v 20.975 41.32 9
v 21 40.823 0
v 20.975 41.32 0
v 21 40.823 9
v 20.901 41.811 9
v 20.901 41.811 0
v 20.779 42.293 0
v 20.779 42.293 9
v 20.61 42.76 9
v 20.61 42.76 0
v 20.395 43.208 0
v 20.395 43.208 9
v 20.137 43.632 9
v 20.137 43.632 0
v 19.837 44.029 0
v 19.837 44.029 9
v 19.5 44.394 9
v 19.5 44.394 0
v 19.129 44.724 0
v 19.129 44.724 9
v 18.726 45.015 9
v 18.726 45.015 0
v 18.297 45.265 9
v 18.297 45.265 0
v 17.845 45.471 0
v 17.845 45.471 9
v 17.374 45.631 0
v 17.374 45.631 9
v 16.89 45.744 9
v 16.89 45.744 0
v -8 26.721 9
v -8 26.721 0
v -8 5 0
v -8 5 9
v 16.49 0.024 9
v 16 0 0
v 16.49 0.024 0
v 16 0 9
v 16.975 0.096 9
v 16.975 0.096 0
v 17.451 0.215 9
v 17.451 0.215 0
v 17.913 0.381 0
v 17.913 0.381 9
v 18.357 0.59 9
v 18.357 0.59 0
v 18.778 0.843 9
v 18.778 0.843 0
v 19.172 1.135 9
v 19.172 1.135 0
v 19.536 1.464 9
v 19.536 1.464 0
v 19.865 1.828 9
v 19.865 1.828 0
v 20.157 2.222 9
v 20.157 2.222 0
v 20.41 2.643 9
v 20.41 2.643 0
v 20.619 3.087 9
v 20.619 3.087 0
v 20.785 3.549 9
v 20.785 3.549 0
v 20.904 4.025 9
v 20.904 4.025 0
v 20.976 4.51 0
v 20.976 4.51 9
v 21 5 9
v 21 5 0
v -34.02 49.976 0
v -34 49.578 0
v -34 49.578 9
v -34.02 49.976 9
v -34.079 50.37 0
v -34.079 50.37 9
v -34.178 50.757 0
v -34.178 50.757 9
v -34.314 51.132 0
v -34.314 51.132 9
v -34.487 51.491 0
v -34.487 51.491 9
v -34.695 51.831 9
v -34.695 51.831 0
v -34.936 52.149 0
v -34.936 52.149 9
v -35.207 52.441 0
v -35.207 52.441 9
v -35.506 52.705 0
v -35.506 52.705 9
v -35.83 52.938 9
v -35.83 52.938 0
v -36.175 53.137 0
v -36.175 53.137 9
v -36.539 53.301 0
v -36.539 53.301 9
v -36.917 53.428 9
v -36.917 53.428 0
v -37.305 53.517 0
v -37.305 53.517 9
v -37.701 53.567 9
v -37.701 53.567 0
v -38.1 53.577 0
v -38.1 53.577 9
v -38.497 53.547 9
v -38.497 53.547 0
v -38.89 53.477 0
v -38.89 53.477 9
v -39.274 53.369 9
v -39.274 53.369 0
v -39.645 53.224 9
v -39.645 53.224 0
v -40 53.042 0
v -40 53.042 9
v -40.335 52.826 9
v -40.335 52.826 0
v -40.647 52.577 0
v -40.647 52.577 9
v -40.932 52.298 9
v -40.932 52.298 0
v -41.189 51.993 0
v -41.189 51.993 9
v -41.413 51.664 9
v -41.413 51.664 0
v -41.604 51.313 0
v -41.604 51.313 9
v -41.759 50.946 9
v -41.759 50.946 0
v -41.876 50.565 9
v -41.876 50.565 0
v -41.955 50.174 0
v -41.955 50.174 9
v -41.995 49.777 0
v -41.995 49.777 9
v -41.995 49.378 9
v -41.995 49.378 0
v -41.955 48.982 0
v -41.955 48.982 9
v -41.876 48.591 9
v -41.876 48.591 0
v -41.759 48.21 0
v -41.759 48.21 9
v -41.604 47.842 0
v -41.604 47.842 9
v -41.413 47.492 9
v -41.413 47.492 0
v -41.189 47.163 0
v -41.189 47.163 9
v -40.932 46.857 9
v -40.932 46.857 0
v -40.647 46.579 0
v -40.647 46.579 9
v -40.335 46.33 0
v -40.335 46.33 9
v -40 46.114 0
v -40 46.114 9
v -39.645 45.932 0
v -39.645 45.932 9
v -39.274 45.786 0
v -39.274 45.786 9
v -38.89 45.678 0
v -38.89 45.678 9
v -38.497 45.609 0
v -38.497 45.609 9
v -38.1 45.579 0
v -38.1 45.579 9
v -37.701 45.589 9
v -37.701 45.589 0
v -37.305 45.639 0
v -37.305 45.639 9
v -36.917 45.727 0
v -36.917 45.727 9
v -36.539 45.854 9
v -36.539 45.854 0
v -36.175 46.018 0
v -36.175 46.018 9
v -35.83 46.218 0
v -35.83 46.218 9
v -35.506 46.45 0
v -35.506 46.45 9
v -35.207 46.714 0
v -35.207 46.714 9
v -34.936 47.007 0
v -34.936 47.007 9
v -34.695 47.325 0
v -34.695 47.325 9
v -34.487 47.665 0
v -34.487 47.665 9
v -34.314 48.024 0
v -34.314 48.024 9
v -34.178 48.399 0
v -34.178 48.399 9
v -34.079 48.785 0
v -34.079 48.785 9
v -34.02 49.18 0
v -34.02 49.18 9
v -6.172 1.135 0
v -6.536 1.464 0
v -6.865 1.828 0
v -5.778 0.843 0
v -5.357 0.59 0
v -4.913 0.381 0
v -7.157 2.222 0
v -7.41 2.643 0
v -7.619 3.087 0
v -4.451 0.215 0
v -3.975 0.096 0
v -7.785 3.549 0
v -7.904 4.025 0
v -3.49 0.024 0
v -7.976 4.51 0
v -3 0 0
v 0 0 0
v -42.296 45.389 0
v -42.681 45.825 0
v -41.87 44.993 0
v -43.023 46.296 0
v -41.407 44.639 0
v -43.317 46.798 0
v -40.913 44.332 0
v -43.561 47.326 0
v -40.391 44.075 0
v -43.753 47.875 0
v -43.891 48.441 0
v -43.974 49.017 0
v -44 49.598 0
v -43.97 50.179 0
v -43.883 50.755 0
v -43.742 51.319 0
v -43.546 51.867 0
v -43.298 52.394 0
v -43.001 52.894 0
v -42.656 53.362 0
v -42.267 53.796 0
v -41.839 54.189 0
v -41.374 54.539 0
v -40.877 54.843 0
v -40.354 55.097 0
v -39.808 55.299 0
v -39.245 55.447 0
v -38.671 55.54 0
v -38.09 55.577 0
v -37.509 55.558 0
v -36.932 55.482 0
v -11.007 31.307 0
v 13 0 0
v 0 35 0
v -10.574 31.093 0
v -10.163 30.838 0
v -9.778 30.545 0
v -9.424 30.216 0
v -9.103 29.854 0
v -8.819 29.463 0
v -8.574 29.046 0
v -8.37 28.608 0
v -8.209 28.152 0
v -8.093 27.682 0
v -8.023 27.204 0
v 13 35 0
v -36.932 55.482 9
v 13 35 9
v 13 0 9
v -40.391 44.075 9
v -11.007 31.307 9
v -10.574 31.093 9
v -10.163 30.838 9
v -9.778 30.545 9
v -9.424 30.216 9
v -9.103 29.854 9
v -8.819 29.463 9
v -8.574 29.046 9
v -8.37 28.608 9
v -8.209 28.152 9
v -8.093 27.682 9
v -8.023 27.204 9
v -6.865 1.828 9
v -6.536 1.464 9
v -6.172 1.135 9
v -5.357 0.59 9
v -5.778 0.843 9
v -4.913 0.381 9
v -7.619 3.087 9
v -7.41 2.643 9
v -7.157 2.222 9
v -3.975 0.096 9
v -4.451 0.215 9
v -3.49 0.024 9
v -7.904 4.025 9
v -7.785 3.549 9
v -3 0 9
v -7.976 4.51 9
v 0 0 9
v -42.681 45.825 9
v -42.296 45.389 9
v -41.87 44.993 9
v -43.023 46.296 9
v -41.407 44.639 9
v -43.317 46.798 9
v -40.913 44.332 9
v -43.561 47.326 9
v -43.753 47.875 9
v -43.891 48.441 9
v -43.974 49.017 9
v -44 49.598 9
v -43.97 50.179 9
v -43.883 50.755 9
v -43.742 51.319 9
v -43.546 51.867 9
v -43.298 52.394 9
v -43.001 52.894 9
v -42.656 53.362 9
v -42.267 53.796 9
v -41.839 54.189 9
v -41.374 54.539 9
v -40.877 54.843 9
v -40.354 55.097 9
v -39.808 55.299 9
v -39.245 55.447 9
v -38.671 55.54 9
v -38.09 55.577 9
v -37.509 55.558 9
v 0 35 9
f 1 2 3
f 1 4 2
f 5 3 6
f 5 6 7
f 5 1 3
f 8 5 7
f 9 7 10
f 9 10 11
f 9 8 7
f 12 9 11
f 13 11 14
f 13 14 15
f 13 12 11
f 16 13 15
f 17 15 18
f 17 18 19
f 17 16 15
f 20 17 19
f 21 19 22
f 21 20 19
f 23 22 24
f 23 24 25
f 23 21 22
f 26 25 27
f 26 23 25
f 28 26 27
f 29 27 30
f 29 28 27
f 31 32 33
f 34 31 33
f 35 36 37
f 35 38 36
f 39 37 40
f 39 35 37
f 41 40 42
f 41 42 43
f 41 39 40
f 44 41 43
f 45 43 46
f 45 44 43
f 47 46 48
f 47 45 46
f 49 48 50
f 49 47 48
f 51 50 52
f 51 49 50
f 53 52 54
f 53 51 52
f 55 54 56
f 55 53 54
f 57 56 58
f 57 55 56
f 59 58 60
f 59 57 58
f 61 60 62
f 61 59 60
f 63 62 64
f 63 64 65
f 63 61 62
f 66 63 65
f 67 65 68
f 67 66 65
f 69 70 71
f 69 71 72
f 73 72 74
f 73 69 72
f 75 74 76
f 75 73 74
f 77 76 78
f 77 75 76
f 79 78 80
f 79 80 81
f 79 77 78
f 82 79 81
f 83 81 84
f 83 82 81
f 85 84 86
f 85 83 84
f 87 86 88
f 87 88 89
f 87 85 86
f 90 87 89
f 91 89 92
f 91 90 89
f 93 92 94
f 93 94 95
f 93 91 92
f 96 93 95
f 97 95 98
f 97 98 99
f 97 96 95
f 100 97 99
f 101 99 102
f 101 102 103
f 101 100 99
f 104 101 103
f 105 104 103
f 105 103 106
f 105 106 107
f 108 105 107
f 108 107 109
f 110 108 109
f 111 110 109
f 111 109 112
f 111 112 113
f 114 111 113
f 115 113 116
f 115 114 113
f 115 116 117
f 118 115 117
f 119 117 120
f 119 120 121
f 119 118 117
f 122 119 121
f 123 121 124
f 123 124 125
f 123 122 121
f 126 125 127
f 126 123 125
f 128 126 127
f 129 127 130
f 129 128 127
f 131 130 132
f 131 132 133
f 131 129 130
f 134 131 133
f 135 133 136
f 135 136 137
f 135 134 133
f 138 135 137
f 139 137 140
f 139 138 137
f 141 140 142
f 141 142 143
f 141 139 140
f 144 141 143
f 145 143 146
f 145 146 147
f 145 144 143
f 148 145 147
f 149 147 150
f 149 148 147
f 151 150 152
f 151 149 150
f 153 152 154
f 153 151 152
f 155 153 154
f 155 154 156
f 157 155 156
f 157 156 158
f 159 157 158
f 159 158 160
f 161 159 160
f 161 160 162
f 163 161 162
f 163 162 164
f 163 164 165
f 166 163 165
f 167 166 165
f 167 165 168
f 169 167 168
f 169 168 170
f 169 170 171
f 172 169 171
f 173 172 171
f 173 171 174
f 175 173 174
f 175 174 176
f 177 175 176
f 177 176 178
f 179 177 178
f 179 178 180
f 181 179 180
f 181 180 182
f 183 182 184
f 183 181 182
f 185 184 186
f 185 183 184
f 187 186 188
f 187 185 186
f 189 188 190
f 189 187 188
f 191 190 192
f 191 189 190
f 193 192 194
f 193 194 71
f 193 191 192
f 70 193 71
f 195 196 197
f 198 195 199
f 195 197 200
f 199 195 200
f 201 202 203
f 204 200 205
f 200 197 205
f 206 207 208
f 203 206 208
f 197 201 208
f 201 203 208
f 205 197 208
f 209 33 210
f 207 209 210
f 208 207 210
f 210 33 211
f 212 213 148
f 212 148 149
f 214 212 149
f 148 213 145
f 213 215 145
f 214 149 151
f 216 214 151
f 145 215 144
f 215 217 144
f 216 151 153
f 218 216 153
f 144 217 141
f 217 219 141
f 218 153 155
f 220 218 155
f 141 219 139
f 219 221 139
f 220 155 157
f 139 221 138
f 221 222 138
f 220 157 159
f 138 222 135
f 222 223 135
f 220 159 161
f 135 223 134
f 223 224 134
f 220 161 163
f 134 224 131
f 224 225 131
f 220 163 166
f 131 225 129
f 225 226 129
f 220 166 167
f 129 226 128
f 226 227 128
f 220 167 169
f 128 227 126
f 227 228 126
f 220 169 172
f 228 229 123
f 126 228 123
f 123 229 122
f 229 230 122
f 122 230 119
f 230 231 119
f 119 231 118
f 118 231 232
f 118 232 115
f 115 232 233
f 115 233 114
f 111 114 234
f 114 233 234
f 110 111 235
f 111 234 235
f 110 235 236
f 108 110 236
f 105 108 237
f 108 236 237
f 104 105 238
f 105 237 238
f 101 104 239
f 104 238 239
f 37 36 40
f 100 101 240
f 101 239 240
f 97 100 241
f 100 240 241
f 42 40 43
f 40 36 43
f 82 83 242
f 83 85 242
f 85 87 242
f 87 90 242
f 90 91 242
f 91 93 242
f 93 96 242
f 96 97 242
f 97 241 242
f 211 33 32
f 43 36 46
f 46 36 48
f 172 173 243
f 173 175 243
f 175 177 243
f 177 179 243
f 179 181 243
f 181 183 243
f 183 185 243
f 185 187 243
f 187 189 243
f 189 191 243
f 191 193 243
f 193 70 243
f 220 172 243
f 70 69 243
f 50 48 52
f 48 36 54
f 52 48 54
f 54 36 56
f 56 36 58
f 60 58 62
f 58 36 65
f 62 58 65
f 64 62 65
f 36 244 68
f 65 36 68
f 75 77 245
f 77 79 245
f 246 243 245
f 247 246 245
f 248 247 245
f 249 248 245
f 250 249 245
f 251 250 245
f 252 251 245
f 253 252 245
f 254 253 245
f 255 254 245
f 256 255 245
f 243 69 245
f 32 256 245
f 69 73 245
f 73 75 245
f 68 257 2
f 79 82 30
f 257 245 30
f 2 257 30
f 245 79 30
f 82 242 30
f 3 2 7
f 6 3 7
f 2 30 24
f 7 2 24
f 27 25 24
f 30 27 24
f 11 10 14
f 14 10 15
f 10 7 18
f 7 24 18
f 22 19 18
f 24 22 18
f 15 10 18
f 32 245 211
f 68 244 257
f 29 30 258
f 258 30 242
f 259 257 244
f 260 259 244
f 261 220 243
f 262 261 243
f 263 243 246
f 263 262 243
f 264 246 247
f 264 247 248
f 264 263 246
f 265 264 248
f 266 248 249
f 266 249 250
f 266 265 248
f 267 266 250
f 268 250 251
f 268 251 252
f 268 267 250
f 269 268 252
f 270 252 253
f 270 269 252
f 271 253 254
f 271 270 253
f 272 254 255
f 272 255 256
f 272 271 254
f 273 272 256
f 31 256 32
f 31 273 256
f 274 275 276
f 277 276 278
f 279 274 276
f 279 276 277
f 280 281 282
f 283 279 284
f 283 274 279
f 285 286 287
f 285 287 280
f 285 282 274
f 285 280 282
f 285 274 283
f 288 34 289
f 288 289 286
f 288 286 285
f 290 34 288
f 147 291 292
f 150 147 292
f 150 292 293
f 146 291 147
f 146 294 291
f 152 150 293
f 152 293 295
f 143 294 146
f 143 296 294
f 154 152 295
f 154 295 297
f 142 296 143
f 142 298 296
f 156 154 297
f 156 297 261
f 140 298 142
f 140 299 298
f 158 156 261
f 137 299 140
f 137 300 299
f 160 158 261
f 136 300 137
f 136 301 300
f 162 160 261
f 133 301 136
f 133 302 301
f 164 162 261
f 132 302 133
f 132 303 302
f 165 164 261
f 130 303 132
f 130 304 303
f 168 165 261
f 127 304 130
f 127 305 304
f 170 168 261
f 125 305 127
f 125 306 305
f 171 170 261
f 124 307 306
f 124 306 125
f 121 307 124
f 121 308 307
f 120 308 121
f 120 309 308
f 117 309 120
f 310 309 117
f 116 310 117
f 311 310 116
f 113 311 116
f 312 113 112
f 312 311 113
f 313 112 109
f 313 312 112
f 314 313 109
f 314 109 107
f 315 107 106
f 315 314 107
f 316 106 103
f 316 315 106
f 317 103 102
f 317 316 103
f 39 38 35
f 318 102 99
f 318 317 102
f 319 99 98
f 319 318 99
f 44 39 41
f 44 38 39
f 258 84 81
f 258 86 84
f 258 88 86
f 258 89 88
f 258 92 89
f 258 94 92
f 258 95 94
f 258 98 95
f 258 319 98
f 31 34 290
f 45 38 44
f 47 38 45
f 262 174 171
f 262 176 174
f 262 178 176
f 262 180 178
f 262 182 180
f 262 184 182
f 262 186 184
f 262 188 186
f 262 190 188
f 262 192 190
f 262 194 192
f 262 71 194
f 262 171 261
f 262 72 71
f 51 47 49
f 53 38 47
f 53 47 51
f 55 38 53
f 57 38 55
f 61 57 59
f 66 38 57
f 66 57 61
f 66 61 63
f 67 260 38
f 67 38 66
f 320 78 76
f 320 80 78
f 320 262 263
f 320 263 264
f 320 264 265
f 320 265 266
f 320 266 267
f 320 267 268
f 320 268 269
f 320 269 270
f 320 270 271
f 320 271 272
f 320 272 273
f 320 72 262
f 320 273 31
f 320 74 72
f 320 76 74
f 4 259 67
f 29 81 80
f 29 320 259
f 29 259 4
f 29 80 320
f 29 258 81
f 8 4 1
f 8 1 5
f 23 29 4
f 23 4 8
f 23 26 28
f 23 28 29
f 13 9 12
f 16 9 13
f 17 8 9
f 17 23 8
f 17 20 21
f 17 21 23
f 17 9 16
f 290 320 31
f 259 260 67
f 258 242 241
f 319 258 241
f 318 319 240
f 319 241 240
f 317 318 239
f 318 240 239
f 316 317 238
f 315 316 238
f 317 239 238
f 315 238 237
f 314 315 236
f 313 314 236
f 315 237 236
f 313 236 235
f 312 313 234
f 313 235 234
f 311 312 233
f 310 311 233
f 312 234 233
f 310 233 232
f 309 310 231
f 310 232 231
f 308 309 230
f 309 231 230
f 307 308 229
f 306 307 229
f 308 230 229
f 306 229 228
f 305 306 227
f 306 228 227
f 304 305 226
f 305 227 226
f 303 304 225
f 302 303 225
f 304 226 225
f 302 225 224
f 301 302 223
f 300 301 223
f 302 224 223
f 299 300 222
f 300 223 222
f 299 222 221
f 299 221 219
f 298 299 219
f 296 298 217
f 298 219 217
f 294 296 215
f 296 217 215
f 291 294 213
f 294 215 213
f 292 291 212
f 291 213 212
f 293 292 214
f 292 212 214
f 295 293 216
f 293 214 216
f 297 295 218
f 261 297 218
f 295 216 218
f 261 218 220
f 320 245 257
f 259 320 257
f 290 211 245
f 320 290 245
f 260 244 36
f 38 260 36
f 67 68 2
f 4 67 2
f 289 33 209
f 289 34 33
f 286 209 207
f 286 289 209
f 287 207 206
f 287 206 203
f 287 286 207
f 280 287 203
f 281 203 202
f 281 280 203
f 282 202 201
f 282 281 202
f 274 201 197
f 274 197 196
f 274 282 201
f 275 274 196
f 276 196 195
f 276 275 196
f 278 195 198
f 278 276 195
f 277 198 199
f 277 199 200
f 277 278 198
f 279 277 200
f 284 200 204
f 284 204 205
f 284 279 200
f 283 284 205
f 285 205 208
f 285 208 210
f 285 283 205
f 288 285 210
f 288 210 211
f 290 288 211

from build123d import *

# Parameters (mm, degrees)
F0_R     = 4
F1_DEPTH = 9
F2_R     = 5


with BuildPart() as f1:
    # F0 (on Top) → F1 (new body)
    with BuildSketch(Plane.XY):
        with BuildLine():
            Line((-40.391175, 44.074847), (-8, 30))
            Line((-8, 30), (-8, 45))
            Line((-8, 45), (21, 45))
            Line((21, 45), (-36.931732, 55.481916))
            ThreePointArc((-36.931732, 55.481916), (-33.395132, 53.424234), (-32, 49.577781))
            ThreePointArc((-32, 49.577781), (-34.709639, 44.560459), (-40.391175, 44.074847))
        make_face()
        with BuildLine():
            ThreePointArc((-36.931732, 55.481916), (-43.741761, 51.319096), (-40.391175, 44.074847))
            ThreePointArc((-40.391175, 44.074847), (-34.709639, 44.560459), (-32, 49.577781))
            ThreePointArc((-32, 49.577781), (-33.395132, 53.424234), (-36.931732, 55.481916))
        make_face()
        with Locations((-38, 49.577781)):
            Circle(F0_R, mode=Mode.SUBTRACT)
        Polygon((-8, 0), (0, 0), (0, 35), (13, 35), (13, 0), (21, 0), (21, 45), (-8, 45), (-8, 30), align=None)
    extrude(amount=F1_DEPTH)

    # F2
    f2_edges = [f1.edges().sort_by_distance(p)[0] for p in [
        (-8, 30, 4.5),
        (21, 45, 4.5),
        (-8, 0, 4.5),
        (21, 0, 4.5),
    ]]
    fillet(f2_edges, radius=F2_R)


solid = f1.part
